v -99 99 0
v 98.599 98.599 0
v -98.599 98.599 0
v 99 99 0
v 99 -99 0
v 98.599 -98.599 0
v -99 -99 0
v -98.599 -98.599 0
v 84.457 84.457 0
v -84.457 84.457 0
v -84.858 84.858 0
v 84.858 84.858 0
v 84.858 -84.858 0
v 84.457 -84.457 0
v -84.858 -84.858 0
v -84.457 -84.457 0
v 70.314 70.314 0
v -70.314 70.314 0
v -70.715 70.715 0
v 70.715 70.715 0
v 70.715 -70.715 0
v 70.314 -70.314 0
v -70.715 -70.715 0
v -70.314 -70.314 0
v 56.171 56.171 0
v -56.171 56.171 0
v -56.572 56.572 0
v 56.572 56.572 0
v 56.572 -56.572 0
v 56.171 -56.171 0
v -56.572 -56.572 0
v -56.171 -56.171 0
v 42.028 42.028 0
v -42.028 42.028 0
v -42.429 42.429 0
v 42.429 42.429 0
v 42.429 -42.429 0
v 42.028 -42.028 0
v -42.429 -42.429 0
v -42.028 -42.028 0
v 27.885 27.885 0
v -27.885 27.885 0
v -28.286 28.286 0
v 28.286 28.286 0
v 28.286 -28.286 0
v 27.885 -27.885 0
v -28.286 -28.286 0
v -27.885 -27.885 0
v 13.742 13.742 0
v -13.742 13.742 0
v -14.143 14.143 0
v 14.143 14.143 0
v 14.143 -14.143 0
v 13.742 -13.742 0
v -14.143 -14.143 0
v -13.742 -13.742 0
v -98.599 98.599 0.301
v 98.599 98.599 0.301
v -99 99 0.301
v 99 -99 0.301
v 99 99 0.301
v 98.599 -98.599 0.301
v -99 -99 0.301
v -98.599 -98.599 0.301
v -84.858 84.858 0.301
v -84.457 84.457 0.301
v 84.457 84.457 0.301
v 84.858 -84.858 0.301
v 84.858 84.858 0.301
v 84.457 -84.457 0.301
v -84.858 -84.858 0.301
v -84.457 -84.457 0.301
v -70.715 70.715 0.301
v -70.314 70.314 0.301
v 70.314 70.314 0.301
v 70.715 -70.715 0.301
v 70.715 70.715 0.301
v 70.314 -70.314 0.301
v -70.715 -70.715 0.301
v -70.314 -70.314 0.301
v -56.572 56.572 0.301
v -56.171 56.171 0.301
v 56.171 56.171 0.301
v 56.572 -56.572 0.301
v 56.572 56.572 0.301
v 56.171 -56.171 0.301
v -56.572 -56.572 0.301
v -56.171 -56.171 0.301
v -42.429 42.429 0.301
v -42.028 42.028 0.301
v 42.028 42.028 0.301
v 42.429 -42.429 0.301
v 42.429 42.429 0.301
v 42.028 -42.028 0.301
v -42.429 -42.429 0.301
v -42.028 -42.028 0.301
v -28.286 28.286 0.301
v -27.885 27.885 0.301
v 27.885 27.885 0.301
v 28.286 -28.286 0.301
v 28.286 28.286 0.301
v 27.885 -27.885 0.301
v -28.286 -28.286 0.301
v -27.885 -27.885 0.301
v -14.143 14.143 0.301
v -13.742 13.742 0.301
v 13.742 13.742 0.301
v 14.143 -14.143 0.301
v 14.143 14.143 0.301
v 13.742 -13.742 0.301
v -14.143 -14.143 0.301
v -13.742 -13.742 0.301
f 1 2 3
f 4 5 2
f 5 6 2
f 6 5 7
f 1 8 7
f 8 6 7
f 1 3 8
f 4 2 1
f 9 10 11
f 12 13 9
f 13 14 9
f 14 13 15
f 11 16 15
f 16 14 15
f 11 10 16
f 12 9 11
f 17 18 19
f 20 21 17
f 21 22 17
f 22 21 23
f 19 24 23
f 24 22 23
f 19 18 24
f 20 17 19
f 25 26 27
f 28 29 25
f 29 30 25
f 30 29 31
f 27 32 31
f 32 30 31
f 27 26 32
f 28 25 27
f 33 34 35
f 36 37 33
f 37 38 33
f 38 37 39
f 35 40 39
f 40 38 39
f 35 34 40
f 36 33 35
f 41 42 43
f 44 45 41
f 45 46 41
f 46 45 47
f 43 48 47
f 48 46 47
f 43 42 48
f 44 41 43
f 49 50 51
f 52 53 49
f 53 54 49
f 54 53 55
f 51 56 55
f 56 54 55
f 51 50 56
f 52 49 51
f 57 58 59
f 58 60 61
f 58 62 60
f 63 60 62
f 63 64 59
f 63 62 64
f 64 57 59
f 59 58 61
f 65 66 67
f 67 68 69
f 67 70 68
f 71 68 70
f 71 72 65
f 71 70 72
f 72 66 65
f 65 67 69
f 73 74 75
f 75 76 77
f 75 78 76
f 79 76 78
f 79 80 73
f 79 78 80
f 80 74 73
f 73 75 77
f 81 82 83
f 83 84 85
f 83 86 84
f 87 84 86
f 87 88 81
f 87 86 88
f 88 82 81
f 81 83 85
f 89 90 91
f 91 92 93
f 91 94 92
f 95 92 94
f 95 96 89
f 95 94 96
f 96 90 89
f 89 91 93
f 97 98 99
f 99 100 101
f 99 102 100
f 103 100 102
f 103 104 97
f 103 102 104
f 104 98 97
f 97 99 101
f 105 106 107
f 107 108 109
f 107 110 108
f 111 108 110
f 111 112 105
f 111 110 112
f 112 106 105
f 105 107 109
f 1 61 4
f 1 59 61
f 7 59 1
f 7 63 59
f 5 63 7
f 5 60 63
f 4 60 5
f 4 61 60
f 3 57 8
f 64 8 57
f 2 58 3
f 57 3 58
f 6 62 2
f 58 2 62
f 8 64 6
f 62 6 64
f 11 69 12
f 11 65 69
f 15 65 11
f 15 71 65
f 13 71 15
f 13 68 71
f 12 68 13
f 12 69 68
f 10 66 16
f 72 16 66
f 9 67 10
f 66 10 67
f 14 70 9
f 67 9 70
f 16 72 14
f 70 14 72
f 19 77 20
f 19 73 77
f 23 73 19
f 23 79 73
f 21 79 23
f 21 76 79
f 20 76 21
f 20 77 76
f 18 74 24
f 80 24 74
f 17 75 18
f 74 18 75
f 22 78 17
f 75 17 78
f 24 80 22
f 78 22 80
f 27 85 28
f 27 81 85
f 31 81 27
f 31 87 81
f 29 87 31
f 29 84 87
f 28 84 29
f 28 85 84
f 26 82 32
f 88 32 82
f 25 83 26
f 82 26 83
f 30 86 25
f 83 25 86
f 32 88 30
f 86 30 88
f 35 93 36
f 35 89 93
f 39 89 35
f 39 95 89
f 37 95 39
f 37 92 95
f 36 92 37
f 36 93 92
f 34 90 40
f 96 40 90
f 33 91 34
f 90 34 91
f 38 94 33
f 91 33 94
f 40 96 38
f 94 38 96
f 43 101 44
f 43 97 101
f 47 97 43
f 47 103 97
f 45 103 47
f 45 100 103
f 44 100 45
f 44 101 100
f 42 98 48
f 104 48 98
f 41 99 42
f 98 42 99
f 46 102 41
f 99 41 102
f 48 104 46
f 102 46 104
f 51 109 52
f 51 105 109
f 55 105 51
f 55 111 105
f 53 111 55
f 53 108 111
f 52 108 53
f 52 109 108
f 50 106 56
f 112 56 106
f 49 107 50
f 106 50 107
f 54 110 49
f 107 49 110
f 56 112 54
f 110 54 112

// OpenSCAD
// examples/bedlevelpattern_examples/blp_showcase_example.scad
// Any of the eight bed level patterns, picked in the Customizer.

include <../../src/bedlevelpattern.scad>;

/* [Pattern] */
bed_level_pattern_type = "concentric squares"; // [concentric squares, spiral squares, concentric circles, x in square, circle in square, grid, padded grid, five circles]

/* [Print area] */
print_area_width = 220.001;
print_area_depth = 220.001;
// Share of the print area the pattern covers (%)
fill_percentage = 90; // [50:100]

/* [Lines] */
line_width = 0.401;
line_height = 0.301;

/* [Concentric and spiral patterns] */
concentric_ring_count = 7;

/* [Grid patterns] */
grid_cell_count = 4;
// Side of each pad on the padded grid
grid_pad_size = 10.001;

/* [Five circles] */
circle_diameter = 20;
outline_distance = 5;

/* [Quality] */
quality_value = 128;

$fn = quality_value;

generate_bed_level_pattern(
  bed_level_pattern_type=bed_level_pattern_type, print_area_width=print_area_width,
  print_area_depth=print_area_depth, line_width=line_width, line_height=line_height,
  fill_percentage=fill_percentage, concentric_ring_count=concentric_ring_count,
  grid_cell_count=grid_cell_count, grid_pad_size=grid_pad_size, circle_diameter=circle_diameter,
  outline_distance=outline_distance
);
